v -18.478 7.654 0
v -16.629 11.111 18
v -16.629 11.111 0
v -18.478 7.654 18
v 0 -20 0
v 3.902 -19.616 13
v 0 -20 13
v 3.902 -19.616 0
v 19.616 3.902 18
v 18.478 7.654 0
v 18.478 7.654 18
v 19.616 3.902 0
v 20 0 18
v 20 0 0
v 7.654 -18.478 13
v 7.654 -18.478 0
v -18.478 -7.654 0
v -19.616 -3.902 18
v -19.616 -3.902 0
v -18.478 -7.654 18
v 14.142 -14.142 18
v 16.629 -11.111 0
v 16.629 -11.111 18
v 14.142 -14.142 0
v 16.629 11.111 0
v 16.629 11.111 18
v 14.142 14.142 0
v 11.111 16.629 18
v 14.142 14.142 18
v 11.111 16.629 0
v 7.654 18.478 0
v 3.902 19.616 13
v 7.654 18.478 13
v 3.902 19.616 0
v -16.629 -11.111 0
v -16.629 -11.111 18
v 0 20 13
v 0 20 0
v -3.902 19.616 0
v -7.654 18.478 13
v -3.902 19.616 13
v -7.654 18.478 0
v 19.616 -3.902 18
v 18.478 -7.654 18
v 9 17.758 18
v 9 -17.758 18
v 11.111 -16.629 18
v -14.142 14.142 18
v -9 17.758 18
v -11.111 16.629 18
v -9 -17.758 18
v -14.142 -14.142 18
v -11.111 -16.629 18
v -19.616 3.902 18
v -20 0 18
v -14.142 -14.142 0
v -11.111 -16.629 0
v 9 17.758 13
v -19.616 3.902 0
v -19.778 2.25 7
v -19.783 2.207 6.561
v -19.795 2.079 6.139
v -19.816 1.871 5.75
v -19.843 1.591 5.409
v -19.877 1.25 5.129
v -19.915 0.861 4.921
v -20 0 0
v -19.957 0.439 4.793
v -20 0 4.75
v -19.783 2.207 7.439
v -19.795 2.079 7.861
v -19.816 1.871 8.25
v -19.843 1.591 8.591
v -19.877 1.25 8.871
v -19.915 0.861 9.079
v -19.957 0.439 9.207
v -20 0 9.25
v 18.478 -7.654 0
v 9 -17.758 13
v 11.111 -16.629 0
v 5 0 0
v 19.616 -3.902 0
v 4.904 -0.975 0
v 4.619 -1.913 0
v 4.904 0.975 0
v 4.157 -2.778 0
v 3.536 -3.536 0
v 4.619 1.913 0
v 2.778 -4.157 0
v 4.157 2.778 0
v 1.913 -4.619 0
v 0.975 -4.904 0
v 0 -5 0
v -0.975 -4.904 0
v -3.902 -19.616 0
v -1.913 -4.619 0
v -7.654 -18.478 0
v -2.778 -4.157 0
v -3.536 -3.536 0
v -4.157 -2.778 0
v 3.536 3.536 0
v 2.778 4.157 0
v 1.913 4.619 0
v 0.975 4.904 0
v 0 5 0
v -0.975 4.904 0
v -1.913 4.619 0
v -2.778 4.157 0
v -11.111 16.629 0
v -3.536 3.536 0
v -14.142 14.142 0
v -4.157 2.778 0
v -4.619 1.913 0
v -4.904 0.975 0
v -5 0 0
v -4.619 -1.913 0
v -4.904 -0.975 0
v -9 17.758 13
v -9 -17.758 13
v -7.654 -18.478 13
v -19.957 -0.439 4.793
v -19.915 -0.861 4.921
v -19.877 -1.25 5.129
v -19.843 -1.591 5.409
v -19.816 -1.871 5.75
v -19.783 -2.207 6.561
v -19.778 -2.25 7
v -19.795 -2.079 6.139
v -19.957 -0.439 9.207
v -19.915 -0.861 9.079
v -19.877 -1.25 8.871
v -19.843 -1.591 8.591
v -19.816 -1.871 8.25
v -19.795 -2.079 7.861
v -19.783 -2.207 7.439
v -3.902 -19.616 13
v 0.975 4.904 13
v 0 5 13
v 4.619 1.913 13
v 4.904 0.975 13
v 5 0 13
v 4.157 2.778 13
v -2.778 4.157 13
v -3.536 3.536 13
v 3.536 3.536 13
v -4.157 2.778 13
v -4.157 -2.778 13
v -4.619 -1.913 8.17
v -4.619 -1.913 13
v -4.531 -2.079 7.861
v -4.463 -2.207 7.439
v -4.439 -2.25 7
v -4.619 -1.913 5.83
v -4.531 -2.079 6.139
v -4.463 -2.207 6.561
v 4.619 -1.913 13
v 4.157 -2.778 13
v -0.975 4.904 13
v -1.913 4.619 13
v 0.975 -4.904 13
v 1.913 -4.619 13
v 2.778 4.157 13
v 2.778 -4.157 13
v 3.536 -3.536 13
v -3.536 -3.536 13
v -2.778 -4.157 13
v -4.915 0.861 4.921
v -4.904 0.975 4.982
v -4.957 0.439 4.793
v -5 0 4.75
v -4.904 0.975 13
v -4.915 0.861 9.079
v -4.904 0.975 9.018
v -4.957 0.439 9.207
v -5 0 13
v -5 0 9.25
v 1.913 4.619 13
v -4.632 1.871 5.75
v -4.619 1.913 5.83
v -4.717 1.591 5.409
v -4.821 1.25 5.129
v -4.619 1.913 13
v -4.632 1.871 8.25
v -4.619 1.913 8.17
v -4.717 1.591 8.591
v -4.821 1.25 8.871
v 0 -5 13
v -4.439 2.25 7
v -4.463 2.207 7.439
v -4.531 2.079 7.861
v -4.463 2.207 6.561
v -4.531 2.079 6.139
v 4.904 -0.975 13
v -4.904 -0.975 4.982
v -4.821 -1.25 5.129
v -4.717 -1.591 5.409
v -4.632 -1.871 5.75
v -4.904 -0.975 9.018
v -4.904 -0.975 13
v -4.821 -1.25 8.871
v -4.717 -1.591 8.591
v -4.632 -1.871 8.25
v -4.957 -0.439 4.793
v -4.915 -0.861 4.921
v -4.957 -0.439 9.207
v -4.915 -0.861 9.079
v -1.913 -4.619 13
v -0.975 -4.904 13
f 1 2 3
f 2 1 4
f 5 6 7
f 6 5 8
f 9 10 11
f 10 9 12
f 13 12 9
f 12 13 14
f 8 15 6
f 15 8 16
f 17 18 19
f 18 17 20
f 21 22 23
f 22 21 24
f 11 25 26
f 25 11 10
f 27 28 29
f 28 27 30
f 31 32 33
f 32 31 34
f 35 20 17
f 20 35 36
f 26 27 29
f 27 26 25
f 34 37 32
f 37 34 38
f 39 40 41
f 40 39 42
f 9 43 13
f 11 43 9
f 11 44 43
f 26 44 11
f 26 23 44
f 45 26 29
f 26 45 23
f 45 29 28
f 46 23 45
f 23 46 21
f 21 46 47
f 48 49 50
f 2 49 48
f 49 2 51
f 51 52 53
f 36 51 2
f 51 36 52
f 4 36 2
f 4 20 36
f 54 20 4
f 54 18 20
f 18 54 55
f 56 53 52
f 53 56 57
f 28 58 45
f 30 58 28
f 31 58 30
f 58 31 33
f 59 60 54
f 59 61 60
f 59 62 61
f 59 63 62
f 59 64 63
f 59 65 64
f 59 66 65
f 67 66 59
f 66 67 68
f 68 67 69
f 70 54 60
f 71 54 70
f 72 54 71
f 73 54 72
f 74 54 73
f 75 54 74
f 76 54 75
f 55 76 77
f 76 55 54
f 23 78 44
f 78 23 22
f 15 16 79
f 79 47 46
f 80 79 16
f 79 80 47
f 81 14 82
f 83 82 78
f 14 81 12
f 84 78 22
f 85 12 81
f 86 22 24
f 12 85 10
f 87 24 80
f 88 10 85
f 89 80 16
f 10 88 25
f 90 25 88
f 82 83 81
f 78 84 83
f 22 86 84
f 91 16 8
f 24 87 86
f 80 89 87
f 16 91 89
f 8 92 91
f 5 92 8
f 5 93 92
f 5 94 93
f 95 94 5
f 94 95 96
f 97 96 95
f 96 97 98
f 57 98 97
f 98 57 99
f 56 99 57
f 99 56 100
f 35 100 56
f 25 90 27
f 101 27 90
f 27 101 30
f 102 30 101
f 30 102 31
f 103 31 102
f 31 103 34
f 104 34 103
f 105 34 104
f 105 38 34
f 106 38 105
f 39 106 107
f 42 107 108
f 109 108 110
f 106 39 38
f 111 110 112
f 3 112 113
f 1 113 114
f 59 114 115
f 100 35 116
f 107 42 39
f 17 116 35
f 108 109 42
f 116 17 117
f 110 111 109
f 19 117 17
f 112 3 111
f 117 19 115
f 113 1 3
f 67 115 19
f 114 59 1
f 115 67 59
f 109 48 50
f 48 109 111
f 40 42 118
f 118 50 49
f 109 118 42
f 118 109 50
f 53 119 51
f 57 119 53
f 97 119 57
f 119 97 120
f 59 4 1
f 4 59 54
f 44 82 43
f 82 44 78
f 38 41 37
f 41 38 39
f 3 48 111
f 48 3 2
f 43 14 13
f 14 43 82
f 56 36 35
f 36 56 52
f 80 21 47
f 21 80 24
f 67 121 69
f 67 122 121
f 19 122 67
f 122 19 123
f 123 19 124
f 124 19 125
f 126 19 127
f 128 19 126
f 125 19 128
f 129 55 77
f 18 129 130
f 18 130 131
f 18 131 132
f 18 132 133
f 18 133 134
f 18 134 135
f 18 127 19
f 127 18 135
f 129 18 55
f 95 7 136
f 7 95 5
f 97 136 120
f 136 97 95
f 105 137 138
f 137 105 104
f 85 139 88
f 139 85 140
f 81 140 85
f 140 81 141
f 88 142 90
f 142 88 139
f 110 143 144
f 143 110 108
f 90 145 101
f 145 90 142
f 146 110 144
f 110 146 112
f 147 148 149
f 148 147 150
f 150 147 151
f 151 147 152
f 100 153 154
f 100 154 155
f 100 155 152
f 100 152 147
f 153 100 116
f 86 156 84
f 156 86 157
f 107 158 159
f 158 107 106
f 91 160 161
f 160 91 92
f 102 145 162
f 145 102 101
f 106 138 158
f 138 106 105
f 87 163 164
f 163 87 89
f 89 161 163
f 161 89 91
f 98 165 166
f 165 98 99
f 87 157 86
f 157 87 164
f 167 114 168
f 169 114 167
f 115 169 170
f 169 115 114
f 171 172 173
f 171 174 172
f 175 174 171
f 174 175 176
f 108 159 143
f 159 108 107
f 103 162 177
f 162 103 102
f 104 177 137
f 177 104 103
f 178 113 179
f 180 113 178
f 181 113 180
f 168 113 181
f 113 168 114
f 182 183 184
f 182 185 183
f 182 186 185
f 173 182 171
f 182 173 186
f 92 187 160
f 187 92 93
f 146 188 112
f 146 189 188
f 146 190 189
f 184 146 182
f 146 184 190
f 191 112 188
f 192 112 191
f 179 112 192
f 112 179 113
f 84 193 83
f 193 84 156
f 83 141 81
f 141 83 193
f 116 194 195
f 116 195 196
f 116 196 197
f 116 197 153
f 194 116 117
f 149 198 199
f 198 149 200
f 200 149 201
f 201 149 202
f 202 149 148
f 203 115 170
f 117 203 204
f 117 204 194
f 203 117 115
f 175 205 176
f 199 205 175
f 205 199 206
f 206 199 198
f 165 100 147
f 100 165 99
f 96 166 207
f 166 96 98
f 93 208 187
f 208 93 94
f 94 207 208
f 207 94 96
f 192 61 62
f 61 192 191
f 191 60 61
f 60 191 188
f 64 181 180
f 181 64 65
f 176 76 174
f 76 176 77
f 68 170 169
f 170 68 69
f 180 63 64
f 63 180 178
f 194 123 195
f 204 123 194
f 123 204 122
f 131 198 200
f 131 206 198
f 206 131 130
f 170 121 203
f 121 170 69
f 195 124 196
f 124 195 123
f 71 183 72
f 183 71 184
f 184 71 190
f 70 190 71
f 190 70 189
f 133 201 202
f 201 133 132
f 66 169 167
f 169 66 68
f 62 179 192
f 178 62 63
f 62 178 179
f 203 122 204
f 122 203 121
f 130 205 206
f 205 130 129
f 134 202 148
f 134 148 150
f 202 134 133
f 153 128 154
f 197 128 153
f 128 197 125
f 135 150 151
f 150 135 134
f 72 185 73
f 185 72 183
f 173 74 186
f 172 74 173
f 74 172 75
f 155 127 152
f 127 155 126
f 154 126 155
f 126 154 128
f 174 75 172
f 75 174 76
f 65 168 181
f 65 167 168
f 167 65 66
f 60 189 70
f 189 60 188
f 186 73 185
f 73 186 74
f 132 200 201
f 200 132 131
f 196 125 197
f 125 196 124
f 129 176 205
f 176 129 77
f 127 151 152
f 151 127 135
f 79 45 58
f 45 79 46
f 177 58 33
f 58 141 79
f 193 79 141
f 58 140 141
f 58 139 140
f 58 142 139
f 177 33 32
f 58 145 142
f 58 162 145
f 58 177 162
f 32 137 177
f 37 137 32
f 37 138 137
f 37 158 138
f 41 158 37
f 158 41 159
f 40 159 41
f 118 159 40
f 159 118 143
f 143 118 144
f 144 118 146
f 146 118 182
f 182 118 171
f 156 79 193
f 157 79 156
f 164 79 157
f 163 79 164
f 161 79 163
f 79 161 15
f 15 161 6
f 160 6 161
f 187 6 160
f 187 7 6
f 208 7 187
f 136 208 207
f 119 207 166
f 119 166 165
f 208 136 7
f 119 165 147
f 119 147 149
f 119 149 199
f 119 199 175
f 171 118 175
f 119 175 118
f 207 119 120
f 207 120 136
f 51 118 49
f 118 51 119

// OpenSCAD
$fn = 32;

// ----------------------------------------------------------------------
// Oldham coupling hub: 40 x 18 mm
// ----------------------------------------------------------------------

// --- parameters (mm) ---
hub_d = 40;               // hub diameter
hub_l = 14;               // hub length
bore_d = 10;              // shaft bore
tongue_w = 18;            // drive tongue width
tongue_h = 4;             // drive tongue height
set_d = 4.5;              // set screw tap hole

module hub() {
  /* the slot side is a raised disc with a groove milled across it */
  cylinder(h = hub_l + tongue_h, d = hub_d);
}

difference() {
  hub();
  translate([0, 0, -1]) cylinder(h = hub_l + tongue_h + 2, d = bore_d);
  translate([-hub_d / 2 - 1, 0, hub_l * 0.5])
    rotate([0, 90, 0]) cylinder(h = hub_d / 2 + 2, d = set_d);
  translate([-tongue_w / 2, -hub_d / 2 - 1, hub_l - 1])
    cube([tongue_w, hub_d + 2, tongue_h + 1]);
}
